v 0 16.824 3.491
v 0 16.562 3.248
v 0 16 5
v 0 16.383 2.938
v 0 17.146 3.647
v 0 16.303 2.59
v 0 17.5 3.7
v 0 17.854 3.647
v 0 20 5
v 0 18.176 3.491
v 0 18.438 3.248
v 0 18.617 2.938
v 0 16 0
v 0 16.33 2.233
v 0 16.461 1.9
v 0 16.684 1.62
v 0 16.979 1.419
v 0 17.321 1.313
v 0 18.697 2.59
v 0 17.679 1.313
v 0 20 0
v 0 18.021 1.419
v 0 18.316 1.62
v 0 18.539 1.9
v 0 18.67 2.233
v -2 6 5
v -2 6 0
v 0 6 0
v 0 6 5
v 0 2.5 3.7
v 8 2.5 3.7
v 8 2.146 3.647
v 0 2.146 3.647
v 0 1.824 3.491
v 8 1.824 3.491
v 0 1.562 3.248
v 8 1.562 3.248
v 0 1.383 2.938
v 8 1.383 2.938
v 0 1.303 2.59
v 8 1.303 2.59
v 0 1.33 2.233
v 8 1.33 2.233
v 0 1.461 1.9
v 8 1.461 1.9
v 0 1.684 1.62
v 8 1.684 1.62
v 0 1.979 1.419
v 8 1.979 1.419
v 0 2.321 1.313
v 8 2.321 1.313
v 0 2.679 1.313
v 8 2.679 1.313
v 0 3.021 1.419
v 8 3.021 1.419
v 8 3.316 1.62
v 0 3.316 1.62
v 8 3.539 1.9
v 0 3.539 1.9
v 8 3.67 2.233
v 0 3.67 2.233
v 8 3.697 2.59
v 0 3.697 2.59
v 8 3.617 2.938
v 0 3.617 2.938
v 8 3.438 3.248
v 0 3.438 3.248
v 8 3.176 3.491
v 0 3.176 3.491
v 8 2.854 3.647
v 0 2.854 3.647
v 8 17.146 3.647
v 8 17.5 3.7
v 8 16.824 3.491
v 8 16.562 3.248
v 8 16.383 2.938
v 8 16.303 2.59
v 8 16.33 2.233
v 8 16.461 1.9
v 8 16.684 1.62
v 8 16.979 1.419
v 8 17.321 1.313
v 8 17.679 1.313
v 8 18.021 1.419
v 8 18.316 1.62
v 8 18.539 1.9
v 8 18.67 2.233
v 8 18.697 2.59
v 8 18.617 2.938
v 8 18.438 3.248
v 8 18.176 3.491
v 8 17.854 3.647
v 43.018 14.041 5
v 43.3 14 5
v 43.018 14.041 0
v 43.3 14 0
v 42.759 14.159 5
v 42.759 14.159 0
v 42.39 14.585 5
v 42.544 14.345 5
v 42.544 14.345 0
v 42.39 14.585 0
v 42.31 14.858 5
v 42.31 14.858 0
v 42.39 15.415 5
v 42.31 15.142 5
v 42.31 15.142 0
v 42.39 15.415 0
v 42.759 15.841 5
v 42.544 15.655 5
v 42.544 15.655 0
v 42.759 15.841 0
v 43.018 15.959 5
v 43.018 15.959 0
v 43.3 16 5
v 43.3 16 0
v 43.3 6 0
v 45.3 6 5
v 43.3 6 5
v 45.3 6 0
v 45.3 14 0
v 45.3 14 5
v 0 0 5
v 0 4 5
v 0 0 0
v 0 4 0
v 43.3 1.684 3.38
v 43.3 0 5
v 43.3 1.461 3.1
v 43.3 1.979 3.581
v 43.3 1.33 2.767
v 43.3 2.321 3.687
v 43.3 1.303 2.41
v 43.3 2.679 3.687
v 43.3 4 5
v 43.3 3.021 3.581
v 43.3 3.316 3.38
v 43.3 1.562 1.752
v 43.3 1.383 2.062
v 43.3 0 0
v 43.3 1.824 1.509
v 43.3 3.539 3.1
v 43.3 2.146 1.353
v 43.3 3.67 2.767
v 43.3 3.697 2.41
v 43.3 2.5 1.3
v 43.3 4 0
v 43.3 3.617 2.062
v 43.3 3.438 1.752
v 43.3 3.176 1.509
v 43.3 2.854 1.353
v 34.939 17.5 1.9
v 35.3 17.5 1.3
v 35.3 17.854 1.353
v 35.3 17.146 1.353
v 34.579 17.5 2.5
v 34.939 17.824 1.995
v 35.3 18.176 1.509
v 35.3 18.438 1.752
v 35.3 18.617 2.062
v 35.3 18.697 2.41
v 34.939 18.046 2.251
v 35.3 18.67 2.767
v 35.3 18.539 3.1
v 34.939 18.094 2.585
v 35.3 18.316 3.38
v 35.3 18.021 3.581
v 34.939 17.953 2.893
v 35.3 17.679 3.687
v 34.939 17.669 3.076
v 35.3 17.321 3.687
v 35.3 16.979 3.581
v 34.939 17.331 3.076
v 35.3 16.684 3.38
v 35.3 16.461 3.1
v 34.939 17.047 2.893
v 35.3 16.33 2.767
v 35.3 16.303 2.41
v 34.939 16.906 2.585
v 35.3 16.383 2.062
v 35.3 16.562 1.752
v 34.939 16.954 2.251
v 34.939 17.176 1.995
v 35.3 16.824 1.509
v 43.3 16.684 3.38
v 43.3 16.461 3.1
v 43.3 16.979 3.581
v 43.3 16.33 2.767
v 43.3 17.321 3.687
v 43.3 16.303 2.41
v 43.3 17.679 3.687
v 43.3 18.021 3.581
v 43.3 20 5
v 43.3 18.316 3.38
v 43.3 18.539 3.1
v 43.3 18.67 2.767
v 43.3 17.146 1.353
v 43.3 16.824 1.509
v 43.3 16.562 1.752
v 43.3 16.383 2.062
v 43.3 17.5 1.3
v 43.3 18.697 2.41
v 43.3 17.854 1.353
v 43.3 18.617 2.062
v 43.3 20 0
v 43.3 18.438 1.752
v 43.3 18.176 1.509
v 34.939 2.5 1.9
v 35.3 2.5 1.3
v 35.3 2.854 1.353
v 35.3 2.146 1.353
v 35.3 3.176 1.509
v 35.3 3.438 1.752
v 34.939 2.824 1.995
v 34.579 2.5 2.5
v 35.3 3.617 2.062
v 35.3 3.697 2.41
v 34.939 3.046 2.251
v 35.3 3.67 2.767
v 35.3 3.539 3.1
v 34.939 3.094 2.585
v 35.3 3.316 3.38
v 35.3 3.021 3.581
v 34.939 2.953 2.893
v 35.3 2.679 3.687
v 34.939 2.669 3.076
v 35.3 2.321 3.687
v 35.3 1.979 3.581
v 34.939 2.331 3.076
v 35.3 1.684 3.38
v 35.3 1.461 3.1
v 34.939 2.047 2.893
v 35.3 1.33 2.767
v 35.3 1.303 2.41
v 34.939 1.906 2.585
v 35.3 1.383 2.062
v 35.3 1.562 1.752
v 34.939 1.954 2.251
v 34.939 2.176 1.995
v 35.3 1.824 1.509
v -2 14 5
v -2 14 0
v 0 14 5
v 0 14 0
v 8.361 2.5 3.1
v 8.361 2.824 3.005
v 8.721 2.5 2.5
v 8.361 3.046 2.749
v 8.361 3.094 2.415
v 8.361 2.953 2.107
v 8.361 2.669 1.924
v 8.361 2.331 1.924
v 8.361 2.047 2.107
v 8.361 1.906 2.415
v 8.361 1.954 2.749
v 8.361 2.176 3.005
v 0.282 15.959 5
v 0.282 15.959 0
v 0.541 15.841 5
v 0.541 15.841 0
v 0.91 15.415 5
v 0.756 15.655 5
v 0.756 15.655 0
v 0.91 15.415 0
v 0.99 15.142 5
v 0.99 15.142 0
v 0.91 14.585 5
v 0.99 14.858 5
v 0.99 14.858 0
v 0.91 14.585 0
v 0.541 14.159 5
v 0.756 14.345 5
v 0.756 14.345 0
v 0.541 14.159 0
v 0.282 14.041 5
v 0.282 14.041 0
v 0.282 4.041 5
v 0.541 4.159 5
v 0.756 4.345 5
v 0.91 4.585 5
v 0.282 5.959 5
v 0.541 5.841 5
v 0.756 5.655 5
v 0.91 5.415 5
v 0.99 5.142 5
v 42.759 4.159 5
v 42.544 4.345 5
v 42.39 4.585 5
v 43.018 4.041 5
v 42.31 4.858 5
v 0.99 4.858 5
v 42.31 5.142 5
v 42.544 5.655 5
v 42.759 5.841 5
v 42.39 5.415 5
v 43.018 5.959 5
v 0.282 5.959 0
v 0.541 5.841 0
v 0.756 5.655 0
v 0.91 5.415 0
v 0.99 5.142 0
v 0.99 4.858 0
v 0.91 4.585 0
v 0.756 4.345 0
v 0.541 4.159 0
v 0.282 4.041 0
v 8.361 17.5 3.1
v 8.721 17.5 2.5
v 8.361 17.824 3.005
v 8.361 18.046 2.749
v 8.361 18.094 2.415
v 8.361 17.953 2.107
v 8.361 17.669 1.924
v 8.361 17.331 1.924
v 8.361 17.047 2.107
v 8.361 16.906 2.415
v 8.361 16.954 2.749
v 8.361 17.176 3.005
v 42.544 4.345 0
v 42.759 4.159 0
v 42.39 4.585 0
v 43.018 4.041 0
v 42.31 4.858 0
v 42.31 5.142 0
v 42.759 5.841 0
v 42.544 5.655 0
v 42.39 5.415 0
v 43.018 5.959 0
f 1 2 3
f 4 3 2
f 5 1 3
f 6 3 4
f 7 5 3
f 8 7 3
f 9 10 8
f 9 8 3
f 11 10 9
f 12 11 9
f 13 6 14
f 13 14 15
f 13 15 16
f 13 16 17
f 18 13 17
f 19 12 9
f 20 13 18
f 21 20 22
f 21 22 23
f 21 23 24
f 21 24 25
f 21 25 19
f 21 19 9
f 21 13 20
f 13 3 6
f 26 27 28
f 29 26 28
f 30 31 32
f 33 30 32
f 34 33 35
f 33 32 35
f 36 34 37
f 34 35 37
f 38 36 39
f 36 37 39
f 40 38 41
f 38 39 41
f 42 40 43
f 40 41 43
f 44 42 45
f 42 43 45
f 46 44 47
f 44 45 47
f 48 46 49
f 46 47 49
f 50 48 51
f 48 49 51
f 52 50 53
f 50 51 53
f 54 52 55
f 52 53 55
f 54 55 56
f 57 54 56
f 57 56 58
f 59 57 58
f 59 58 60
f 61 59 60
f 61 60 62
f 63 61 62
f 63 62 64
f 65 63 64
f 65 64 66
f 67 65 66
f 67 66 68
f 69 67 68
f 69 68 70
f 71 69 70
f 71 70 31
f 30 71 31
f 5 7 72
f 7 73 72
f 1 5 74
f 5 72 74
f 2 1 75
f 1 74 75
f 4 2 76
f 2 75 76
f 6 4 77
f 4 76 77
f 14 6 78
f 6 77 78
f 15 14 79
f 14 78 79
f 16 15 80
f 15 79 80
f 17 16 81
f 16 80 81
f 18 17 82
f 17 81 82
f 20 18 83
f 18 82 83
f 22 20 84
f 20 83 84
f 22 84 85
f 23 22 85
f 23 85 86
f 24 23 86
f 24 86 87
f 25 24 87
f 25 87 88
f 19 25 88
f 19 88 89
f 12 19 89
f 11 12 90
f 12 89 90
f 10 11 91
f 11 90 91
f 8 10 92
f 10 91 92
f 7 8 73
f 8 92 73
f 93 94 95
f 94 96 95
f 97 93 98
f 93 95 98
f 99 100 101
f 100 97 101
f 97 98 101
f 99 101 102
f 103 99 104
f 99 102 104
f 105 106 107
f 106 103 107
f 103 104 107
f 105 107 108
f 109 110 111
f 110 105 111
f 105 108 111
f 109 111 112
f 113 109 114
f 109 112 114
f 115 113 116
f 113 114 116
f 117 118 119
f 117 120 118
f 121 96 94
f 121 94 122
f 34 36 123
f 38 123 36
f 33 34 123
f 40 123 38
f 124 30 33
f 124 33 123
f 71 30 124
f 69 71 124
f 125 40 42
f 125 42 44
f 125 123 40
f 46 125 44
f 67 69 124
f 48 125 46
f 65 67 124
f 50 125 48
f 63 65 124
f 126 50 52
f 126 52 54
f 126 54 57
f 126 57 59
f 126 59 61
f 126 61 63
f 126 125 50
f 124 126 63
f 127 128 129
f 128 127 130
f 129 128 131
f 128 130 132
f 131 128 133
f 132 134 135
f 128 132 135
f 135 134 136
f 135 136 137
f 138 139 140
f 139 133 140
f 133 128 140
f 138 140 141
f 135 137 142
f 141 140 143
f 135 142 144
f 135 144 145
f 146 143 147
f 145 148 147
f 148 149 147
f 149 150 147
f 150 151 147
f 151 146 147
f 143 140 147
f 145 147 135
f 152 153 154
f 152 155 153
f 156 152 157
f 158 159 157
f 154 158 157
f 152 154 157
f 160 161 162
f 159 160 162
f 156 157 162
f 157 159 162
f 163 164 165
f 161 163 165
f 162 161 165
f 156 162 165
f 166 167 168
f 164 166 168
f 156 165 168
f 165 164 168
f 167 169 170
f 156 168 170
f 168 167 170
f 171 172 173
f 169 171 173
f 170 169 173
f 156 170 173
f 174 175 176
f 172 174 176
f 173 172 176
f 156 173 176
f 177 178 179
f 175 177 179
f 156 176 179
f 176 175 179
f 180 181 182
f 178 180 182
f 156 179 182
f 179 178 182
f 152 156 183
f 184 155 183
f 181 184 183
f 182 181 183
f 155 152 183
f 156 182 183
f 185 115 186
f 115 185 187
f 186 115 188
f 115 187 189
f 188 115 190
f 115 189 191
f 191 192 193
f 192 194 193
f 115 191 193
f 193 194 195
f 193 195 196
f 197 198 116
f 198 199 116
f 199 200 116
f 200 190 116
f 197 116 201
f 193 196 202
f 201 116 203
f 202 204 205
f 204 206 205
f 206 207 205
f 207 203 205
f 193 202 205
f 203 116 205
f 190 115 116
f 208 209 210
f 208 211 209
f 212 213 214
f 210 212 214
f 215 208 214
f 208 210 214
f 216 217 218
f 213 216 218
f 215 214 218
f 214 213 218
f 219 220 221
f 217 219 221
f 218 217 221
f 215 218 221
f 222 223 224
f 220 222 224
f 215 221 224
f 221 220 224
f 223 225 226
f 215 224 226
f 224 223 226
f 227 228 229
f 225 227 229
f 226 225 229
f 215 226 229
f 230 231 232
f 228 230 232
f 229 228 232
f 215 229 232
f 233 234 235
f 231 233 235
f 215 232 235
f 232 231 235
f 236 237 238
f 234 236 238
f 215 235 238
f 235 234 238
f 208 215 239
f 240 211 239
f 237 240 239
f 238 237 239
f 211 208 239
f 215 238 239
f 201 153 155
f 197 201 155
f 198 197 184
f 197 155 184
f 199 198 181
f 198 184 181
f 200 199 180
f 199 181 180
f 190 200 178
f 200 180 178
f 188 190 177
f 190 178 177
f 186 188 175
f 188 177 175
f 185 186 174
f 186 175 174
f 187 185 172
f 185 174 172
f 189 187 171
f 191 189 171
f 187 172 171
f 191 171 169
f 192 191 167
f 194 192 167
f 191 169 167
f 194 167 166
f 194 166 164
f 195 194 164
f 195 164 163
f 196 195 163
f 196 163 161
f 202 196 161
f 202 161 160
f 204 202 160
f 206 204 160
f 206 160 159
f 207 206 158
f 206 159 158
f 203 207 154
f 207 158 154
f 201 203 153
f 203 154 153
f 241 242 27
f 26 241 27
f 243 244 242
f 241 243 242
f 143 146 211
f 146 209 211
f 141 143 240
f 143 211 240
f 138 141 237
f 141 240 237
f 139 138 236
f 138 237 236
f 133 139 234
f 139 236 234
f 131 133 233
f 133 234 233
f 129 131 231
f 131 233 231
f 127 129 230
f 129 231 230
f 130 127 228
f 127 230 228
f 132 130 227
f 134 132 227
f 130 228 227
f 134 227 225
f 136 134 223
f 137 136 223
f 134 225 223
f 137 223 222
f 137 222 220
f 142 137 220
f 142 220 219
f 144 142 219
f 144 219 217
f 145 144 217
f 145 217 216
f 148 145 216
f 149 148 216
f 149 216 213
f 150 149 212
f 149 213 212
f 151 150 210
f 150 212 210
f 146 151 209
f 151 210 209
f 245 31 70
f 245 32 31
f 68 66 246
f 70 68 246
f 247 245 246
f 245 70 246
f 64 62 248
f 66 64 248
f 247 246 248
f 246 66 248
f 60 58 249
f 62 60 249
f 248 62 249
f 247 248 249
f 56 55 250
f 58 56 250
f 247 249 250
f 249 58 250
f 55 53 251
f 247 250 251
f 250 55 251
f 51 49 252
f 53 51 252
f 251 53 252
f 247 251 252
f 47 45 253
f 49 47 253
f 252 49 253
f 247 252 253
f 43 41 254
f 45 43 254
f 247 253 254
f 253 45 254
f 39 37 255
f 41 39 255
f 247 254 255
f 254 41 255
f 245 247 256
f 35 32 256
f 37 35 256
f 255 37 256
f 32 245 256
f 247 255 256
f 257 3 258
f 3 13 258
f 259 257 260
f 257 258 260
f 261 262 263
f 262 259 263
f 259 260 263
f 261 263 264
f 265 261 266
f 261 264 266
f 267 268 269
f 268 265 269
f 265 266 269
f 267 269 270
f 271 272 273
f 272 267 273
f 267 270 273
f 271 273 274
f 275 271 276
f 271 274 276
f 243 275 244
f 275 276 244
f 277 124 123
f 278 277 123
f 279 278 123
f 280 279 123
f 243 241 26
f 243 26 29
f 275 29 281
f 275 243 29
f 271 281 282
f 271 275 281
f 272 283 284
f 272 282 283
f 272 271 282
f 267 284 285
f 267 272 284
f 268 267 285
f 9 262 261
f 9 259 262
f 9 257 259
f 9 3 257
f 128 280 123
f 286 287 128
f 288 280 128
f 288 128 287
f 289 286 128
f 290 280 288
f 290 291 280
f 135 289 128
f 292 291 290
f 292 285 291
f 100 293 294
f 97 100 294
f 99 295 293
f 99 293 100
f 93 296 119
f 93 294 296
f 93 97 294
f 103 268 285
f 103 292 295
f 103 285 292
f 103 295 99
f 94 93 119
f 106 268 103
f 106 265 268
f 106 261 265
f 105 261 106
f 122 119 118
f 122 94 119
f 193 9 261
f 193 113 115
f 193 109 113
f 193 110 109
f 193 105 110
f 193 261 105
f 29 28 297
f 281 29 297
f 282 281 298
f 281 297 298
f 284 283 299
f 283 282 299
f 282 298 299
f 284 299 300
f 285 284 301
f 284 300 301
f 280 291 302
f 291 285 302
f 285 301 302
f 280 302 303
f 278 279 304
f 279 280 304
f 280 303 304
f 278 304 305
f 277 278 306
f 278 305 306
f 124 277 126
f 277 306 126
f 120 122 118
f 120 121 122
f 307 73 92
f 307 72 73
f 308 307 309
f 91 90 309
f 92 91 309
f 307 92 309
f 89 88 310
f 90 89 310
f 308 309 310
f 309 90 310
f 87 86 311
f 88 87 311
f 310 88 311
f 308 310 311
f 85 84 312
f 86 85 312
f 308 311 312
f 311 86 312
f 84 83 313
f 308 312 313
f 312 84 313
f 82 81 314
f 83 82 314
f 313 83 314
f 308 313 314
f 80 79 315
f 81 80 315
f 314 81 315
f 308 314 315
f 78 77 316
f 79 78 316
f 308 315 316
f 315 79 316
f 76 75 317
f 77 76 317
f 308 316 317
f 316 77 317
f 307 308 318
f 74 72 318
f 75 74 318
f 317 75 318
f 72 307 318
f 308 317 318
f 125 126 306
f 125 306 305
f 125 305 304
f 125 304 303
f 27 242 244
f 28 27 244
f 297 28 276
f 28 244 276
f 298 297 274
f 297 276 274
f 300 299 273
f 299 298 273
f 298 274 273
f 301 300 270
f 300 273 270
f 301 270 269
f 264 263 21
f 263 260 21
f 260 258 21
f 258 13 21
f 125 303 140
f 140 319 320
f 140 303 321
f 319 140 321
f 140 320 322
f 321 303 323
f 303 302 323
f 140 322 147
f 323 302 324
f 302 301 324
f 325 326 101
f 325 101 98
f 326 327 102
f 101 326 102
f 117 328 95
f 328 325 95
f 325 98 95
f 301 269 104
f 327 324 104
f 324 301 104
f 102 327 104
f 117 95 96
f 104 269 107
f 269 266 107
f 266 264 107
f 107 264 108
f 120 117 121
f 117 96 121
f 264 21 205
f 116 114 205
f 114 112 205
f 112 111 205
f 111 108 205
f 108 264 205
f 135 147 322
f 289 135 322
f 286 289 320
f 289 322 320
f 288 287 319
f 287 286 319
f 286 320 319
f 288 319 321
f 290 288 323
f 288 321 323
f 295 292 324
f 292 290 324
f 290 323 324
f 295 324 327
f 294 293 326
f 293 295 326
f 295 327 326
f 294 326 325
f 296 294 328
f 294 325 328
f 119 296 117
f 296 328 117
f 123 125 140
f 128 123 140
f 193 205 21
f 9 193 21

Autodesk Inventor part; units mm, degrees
ref_plane "YZ Plane" through (0, 0, 0) normal (1, 0, 0) x (0, 1, 0)
ref_plane "XZ Plane" through (0, 0, 0) normal (0, 1, 0) x (-1, 0, 0)
ref_plane "XY Plane" through (0, 0, 0) normal (0, 0, 1) x (1, 0, 0)
sketch "スケッチ1" plane through (0, 0, 0) normal (0, 0, 1) x (1, 0, 0)
  line L0 (0, 0) -> (43.3, 0)
  line L1 (43.3, 20) -> (0, 20)
  line L2 (0, 10) -> (43.3, 10) construction
  line L3 (43.3, 14) -> (45.3, 14)
  line L4 (45.3, 14) -> (45.3, 6)
  line L5 (45.3, 6) -> (43.3, 6)
  arc A0 (43.3, 16) -> (43.3, 14) centre (43.3, 15) ccw
  arc A1 (43.3, 6) -> (43.3, 4) centre (43.3, 5) ccw
  line L6 (43.3, 0) -> (43.3, 4)
  line L7 (43.3, 16) -> (43.3, 20)
  line L8 (21.65, 20) -> (21.65, 0) construction
  line L9 (0, 14) -> (-2, 14)
  line L10 (-2, 14) -> (-2, 6)
  line L11 (-2, 6) -> (0, 6)
  arc A2 (0, 14) -> (0, 16) centre (0, 15) ccw
  arc A3 (0, 4) -> (0, 6) centre (0, 5) ccw
  line L12 (0, 0) -> (0, 4)
  line L13 (0, 16) -> (0, 20)
  dimension "d0" = 43.3
  dimension "d1" = 20
  dimension "d5" = 8
  dimension "d6" = 2
extrude "押し出し1" add sketch "スケッチ1" along normal blind 5
sketch "スケッチ3" plane through (43.3, 0, 0) normal (1, 0, 0) x (0, 0, -1)
  line L0 (0, 0) -> (-5, 0) projected
  line L1 (-2.5, 0) -> (-2.5, 20) construction
  line L2 (0, 20) -> (-5, 20) projected
  line L3 (-2.5, 10) -> (0, 10) construction
  line L4 (0, 6) -> (0, 14) projected
  point P0 (-2.5, 17.5)
  point P1 (-2.5, 2.5)
  dimension "d7" = 15
hole "穴1" at (43.3, 17.5, 2.5) at (43.3, 2.5, 2.5) direction (-1, 0, 0) diameter 2.4 depth 8 tip angle 118
sketch "スケッチ4" plane through (0, 16, 0) normal (-1, 0, 0) x (0, 0, 1)
  circle A0 centre (2.5, 1.5) radius 1.2 projected
  circle A1 centre (2.5, -13.5) radius 1.2 projected
  circle A2 centre (2.5, -13.5) radius 1.2 projected
  point P0 (0, -16)
hole "穴2" at (0, 17.5, 2.5) at (0, 2.5, 2.5) direction (1, 0, 0) diameter 2.4 depth 8 tip angle 118
properties part number "頭_メインフレームセンター２" material "アセタール樹脂、黒"
